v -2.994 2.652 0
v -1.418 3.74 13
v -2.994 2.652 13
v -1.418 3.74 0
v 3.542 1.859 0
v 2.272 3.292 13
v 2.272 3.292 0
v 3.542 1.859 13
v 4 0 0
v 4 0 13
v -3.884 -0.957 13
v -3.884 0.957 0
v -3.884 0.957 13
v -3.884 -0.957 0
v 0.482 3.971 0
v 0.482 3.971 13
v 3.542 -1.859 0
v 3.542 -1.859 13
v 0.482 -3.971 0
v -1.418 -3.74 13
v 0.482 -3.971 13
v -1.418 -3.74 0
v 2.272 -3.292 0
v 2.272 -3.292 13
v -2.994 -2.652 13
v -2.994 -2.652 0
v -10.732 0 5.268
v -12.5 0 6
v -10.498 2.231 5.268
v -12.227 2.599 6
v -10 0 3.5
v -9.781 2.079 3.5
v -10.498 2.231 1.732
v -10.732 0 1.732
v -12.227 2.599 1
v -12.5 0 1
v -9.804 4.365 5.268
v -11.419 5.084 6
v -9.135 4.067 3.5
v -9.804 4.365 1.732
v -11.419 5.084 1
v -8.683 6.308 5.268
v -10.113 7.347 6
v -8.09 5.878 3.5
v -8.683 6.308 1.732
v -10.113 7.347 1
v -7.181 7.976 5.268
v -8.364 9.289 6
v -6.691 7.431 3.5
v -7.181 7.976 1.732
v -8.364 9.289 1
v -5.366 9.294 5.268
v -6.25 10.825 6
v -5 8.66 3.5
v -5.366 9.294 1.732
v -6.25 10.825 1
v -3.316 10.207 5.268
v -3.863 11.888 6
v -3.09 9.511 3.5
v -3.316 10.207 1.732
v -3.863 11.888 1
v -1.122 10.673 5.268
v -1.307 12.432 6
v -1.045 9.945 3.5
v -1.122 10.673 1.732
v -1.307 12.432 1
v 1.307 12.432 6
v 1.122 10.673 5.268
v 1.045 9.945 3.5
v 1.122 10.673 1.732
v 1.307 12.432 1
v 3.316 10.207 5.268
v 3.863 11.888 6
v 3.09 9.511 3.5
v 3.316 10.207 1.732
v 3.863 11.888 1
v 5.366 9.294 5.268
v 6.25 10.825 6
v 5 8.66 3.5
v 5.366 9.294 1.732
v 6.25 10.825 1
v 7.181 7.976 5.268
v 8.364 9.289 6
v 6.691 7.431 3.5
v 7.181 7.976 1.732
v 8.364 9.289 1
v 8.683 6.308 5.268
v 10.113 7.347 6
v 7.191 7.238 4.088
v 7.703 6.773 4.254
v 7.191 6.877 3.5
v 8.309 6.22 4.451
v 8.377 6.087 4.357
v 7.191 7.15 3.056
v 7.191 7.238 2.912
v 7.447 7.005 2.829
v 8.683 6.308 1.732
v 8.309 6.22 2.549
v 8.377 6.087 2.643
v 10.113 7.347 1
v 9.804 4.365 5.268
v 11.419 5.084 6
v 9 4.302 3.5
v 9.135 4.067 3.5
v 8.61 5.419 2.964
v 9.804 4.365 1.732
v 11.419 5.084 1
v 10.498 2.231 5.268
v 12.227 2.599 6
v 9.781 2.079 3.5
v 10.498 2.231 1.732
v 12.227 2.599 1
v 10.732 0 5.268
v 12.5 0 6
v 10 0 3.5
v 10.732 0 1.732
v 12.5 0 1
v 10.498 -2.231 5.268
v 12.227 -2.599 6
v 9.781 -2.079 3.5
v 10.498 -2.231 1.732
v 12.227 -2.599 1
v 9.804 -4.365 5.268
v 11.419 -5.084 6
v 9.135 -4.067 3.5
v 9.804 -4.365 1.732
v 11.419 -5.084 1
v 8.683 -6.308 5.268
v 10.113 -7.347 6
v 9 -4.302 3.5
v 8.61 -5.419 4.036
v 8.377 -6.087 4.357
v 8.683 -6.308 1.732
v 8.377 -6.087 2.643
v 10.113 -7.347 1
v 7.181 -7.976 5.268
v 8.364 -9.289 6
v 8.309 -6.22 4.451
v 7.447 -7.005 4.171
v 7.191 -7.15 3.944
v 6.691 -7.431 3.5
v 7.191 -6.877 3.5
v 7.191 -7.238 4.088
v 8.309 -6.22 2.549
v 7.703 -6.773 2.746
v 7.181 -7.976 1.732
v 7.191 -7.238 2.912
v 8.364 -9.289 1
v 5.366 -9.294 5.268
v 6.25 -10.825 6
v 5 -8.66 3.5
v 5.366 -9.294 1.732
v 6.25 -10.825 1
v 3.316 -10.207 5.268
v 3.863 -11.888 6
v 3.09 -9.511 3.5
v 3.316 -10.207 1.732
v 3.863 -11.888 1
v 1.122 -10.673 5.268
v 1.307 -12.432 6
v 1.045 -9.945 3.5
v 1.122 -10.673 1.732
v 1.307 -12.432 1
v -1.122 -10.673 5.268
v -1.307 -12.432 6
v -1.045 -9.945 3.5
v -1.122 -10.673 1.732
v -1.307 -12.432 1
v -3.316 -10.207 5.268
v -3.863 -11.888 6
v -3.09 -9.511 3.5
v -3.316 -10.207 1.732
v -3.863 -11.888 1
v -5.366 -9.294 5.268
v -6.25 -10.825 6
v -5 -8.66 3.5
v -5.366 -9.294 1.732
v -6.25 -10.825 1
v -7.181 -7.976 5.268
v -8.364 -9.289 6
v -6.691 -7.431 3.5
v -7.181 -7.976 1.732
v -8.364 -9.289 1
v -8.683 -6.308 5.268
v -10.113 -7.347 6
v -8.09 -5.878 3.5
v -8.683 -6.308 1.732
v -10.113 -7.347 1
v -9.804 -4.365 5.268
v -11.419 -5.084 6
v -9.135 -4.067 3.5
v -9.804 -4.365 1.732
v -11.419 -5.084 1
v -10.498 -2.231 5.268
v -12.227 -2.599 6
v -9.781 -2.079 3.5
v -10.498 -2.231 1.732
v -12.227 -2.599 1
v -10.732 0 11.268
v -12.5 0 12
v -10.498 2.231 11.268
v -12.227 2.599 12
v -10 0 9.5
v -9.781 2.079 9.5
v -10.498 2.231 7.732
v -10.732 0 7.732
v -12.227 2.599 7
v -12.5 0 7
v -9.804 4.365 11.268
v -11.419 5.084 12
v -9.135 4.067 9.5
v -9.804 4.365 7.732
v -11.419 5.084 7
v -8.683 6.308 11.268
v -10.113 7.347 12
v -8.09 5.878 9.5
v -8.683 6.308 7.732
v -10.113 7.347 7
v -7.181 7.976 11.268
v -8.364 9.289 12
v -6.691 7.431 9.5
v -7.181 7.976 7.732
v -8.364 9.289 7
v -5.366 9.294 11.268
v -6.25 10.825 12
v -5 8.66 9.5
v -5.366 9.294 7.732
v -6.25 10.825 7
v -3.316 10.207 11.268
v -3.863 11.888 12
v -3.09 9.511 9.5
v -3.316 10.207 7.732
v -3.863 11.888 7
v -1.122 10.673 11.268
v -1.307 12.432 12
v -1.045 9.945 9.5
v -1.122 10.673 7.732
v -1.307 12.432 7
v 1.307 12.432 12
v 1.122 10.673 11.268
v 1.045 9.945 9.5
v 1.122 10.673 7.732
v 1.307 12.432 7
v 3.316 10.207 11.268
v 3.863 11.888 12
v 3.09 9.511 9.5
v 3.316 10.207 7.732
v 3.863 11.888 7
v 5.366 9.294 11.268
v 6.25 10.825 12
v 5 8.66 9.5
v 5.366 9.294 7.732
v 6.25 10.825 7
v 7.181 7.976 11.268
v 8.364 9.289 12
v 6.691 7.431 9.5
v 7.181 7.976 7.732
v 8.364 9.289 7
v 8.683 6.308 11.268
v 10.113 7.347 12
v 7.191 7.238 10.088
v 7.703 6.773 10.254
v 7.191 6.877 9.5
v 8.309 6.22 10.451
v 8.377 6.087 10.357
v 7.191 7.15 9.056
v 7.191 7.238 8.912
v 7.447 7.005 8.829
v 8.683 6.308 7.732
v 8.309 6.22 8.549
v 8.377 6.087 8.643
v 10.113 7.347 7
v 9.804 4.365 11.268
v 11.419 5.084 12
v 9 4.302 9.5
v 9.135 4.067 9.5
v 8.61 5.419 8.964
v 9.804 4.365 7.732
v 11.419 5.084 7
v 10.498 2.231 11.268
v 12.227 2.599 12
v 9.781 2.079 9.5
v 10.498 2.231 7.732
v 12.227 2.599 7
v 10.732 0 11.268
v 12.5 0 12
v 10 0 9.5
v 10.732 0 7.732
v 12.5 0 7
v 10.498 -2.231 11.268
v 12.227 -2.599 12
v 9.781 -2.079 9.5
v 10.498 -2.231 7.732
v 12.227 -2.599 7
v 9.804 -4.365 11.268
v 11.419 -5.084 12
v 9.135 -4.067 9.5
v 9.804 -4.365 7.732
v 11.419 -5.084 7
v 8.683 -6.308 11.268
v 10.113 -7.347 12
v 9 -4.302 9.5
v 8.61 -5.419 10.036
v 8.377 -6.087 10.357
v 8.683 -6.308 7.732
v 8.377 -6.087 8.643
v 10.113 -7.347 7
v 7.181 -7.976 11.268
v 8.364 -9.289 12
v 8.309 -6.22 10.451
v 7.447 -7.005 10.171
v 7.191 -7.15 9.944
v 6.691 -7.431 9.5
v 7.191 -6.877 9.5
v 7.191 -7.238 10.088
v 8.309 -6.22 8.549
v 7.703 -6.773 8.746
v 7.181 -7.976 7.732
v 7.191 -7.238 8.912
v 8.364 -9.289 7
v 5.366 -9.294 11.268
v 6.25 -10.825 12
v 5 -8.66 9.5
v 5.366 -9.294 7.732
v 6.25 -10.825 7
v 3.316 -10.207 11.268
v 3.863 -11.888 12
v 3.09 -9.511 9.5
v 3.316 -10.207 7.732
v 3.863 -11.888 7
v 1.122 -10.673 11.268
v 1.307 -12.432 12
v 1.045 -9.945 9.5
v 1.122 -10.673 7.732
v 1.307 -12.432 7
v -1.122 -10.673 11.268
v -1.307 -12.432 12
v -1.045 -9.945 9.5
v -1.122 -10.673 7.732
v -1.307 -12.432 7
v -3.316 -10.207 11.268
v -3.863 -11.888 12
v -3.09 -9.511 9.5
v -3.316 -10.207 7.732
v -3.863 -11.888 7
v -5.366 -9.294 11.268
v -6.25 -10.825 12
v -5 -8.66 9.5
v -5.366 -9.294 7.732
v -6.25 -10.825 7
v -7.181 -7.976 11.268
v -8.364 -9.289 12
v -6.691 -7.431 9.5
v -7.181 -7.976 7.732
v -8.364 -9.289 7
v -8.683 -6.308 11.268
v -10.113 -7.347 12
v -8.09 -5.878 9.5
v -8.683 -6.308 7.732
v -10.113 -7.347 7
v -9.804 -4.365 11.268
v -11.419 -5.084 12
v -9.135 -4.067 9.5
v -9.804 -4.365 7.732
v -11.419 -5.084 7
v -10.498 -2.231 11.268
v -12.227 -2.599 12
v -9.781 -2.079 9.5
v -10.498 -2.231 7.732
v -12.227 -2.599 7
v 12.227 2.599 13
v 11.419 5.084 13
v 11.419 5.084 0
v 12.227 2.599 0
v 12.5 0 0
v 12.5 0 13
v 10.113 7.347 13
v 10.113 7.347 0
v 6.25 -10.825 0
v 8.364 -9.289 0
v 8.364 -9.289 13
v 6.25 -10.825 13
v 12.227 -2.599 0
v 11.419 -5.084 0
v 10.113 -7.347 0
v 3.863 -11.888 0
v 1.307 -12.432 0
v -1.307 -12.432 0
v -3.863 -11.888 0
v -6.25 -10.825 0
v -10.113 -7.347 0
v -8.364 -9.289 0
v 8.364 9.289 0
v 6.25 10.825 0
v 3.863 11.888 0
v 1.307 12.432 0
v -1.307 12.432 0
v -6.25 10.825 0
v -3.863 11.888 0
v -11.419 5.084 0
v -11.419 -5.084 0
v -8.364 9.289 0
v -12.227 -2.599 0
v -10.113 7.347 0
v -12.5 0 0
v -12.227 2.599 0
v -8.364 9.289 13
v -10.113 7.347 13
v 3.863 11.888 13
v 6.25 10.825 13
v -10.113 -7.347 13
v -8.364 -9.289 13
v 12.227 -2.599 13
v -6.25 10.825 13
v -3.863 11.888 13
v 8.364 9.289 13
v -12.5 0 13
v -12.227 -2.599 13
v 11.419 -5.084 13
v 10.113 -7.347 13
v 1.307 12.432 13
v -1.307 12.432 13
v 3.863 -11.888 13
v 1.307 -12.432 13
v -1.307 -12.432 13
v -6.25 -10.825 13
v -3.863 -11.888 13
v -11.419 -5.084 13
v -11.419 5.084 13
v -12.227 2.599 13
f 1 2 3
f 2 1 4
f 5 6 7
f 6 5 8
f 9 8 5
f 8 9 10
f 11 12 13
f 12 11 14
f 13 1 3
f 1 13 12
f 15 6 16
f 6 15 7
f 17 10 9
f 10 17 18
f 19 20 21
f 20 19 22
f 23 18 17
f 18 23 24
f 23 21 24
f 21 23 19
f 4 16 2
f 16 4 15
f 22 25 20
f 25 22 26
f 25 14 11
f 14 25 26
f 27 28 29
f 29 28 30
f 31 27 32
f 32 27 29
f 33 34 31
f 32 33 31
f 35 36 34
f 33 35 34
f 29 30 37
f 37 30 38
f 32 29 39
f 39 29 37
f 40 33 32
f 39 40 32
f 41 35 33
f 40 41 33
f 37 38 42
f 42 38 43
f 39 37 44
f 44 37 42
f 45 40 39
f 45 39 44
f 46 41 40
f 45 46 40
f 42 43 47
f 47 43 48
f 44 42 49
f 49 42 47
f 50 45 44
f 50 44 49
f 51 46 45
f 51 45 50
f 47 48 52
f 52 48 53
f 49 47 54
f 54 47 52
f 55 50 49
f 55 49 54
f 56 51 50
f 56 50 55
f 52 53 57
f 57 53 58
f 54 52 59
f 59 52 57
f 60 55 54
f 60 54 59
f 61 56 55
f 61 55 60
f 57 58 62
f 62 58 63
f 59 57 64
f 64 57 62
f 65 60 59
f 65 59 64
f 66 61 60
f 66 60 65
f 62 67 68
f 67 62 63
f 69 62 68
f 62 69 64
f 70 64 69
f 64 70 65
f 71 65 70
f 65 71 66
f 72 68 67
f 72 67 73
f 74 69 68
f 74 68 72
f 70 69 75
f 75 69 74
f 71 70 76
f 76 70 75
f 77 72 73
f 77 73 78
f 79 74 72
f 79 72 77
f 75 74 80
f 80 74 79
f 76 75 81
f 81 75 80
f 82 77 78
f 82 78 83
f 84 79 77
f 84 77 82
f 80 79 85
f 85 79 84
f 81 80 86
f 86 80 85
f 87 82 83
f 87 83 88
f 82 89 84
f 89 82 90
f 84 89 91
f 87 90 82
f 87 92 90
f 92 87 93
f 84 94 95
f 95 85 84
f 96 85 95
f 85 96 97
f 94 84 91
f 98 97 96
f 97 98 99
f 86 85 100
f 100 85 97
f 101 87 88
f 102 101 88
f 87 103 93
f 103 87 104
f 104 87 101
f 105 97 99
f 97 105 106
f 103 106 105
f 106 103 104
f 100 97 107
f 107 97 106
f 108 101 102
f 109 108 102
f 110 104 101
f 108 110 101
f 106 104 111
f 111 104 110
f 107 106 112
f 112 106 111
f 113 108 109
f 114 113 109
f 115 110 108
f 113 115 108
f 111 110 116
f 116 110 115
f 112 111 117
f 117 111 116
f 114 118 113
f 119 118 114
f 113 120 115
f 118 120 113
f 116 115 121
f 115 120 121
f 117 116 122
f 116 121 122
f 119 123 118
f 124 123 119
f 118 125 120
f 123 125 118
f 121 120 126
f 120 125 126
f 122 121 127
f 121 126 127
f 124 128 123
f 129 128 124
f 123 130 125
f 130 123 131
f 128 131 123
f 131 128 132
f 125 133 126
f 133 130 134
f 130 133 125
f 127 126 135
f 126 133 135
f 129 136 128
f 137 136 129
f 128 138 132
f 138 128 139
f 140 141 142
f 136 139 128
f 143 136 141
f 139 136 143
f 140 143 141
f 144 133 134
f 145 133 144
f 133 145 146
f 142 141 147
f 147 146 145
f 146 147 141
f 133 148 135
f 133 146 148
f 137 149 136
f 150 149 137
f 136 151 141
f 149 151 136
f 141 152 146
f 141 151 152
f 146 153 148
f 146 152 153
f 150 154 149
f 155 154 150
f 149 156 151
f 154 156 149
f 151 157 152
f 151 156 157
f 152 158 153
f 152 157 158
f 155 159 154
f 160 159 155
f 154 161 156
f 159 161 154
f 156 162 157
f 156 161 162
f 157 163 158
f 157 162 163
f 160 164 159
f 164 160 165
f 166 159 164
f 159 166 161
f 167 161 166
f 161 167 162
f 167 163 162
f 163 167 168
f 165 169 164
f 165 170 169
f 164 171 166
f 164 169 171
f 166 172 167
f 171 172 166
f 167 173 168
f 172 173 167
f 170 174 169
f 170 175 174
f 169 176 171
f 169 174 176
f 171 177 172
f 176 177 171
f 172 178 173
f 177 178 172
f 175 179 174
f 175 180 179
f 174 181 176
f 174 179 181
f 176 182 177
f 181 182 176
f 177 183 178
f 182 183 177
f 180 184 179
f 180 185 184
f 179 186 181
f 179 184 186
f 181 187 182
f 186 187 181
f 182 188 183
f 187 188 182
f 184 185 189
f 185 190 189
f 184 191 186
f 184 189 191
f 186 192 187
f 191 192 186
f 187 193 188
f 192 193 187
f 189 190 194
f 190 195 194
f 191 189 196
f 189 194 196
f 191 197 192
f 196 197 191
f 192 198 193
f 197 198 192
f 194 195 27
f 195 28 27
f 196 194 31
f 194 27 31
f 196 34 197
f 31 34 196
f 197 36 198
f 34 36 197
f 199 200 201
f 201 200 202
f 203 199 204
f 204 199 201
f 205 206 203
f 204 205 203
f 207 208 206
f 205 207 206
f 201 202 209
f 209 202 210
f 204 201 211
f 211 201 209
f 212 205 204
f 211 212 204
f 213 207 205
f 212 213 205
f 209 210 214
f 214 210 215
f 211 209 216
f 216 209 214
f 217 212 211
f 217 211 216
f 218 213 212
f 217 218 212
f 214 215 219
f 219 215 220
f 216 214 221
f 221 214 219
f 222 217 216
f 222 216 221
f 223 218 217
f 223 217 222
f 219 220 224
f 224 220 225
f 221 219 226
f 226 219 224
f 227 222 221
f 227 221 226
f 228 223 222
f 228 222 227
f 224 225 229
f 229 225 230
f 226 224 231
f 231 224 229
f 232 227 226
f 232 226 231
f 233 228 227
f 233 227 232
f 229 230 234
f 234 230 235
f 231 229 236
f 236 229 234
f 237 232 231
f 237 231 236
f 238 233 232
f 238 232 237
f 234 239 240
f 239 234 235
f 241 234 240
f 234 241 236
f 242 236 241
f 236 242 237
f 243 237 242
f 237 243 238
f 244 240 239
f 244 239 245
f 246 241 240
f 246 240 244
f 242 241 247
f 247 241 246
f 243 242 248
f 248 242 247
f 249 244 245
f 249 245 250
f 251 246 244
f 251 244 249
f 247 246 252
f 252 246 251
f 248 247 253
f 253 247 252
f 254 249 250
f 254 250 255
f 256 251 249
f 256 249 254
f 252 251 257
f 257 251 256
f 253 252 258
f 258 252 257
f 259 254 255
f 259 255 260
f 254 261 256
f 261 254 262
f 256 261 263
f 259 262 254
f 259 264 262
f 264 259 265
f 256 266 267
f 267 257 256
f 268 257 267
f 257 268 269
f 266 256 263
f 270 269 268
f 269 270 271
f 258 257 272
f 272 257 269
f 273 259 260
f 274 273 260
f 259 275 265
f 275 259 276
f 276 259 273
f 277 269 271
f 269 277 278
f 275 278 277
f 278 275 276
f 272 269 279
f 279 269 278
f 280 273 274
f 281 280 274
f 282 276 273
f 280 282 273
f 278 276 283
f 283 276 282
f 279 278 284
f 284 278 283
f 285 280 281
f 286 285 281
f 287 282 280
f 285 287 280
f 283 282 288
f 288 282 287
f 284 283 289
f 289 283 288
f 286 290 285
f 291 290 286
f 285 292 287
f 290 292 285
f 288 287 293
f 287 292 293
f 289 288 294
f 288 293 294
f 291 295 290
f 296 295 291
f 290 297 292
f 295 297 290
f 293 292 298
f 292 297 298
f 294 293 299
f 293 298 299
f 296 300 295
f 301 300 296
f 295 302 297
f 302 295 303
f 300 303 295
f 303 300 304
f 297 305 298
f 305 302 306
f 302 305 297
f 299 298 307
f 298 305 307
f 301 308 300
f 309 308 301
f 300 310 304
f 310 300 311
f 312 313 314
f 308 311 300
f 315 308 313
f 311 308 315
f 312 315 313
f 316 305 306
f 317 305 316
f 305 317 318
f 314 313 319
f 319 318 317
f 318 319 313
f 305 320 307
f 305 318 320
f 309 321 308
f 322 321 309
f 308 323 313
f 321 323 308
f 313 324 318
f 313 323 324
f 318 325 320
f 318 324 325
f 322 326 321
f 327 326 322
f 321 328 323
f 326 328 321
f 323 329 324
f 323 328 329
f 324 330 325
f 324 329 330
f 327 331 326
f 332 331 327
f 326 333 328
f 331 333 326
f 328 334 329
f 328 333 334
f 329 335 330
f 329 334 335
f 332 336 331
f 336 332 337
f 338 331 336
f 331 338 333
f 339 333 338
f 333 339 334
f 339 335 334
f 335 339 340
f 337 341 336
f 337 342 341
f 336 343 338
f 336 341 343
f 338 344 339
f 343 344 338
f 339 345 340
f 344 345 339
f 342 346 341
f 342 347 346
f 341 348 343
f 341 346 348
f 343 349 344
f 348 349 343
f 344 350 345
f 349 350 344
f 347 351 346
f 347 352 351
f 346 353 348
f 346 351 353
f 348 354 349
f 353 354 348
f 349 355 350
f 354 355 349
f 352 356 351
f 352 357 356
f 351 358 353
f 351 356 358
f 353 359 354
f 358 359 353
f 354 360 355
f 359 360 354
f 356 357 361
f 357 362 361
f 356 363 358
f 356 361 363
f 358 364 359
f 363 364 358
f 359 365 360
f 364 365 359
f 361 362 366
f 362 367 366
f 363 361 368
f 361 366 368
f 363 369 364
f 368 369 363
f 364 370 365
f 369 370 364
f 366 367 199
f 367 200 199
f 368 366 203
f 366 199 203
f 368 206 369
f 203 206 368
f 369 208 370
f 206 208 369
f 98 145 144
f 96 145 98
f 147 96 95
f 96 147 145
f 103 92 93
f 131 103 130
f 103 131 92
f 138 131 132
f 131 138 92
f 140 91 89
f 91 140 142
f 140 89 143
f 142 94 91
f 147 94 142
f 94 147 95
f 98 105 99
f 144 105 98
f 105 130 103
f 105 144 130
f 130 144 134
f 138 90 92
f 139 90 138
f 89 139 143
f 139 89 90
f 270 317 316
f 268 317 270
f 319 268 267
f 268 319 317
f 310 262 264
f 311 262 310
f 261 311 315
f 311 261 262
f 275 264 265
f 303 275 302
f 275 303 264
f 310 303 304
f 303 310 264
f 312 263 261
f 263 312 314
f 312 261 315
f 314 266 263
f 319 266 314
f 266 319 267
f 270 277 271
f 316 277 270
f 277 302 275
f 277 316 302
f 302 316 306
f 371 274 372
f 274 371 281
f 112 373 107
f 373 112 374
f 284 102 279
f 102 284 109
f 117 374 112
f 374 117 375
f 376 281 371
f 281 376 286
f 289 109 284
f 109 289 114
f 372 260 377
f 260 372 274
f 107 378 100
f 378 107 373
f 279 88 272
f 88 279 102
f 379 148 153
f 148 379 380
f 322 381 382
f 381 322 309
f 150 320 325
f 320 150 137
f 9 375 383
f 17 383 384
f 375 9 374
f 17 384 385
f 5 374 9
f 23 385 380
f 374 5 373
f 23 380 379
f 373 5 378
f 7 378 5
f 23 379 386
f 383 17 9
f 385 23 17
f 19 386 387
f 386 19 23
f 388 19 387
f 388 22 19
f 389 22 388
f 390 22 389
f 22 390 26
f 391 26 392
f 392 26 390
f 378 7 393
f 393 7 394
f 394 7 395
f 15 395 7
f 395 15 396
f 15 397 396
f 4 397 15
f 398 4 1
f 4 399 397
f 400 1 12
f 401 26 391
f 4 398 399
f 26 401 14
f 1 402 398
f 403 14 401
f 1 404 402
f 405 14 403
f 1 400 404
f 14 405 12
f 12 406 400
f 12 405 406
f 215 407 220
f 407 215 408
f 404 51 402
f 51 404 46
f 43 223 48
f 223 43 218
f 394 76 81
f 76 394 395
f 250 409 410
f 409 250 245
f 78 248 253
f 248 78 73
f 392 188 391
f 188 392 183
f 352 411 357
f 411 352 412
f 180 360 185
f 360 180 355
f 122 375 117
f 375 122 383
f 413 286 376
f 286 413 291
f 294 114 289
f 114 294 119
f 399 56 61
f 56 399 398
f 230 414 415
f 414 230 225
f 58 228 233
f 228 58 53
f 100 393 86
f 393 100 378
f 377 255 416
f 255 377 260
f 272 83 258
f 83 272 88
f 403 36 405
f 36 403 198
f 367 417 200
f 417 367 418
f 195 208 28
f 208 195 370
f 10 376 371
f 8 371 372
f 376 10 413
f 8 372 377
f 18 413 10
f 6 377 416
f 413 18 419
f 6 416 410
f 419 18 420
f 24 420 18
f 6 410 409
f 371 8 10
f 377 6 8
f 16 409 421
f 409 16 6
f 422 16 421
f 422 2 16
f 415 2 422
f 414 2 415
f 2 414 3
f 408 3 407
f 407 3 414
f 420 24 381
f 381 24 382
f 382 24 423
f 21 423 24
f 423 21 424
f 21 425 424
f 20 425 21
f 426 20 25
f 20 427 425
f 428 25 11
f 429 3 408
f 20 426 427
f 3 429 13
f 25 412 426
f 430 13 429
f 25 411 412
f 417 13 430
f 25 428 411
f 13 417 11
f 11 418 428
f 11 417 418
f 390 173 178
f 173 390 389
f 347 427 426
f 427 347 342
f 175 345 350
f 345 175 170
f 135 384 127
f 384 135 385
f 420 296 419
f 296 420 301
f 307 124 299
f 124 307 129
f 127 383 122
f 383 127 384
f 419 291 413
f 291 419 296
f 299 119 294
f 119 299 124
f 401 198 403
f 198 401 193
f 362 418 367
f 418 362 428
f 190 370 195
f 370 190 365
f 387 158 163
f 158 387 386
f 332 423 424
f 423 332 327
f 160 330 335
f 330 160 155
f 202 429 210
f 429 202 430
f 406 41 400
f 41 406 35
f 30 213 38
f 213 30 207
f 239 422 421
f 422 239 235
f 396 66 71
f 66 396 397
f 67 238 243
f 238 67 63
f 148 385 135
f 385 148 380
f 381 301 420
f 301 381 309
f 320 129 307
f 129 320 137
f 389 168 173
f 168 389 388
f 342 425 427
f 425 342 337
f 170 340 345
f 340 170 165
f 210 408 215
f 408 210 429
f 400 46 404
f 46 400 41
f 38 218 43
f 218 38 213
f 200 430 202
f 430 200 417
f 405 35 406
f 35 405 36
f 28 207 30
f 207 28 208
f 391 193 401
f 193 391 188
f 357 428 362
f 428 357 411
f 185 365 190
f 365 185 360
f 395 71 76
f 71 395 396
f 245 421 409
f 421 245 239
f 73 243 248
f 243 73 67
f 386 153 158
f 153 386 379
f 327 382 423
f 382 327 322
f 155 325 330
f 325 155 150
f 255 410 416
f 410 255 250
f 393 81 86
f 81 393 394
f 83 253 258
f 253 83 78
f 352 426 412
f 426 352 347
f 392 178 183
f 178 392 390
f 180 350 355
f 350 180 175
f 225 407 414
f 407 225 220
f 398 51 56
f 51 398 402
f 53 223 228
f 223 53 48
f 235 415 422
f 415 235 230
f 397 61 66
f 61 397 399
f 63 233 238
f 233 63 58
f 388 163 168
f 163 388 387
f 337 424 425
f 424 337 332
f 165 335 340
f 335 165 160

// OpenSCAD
outerdia = 25;
cutoutdia = 5;
wireholedia = 2;
addthick = 1;
shaftdia = 8;

difference(){
    union(){
        cylinder(r = outerdia/2, h = (cutoutdia+addthick*1.5)*2);
    }
    
    union(){
        translate([0,0,-.5]){cylinder(r = shaftdia/2, h = (cutoutdia+addthick*1.5)*2 + 1);}
        
        translate([0,0,addthick+cutoutdia/2]){rotate_extrude(angle=360){
        translate([outerdia/2,0]){circle(d = cutoutdia);}}}
    
        translate([0,0,addthick+3*cutoutdia/2+addthick]){rotate_extrude(angle=360){
        translate([outerdia/2,0]){circle(d = cutoutdia);}}}
    
        translate([shaftdia,outerdia/2,addthick+cutoutdia/2]){rotate(a = [90,0,0]){cylinder(r = wireholedia/2, h = outerdia);}}
        
        translate([shaftdia,outerdia/2,addthick+3*cutoutdia/2+addthick]){rotate(a = [90,0,0]){cylinder(r = wireholedia/2, h = outerdia);}}
    }
}
